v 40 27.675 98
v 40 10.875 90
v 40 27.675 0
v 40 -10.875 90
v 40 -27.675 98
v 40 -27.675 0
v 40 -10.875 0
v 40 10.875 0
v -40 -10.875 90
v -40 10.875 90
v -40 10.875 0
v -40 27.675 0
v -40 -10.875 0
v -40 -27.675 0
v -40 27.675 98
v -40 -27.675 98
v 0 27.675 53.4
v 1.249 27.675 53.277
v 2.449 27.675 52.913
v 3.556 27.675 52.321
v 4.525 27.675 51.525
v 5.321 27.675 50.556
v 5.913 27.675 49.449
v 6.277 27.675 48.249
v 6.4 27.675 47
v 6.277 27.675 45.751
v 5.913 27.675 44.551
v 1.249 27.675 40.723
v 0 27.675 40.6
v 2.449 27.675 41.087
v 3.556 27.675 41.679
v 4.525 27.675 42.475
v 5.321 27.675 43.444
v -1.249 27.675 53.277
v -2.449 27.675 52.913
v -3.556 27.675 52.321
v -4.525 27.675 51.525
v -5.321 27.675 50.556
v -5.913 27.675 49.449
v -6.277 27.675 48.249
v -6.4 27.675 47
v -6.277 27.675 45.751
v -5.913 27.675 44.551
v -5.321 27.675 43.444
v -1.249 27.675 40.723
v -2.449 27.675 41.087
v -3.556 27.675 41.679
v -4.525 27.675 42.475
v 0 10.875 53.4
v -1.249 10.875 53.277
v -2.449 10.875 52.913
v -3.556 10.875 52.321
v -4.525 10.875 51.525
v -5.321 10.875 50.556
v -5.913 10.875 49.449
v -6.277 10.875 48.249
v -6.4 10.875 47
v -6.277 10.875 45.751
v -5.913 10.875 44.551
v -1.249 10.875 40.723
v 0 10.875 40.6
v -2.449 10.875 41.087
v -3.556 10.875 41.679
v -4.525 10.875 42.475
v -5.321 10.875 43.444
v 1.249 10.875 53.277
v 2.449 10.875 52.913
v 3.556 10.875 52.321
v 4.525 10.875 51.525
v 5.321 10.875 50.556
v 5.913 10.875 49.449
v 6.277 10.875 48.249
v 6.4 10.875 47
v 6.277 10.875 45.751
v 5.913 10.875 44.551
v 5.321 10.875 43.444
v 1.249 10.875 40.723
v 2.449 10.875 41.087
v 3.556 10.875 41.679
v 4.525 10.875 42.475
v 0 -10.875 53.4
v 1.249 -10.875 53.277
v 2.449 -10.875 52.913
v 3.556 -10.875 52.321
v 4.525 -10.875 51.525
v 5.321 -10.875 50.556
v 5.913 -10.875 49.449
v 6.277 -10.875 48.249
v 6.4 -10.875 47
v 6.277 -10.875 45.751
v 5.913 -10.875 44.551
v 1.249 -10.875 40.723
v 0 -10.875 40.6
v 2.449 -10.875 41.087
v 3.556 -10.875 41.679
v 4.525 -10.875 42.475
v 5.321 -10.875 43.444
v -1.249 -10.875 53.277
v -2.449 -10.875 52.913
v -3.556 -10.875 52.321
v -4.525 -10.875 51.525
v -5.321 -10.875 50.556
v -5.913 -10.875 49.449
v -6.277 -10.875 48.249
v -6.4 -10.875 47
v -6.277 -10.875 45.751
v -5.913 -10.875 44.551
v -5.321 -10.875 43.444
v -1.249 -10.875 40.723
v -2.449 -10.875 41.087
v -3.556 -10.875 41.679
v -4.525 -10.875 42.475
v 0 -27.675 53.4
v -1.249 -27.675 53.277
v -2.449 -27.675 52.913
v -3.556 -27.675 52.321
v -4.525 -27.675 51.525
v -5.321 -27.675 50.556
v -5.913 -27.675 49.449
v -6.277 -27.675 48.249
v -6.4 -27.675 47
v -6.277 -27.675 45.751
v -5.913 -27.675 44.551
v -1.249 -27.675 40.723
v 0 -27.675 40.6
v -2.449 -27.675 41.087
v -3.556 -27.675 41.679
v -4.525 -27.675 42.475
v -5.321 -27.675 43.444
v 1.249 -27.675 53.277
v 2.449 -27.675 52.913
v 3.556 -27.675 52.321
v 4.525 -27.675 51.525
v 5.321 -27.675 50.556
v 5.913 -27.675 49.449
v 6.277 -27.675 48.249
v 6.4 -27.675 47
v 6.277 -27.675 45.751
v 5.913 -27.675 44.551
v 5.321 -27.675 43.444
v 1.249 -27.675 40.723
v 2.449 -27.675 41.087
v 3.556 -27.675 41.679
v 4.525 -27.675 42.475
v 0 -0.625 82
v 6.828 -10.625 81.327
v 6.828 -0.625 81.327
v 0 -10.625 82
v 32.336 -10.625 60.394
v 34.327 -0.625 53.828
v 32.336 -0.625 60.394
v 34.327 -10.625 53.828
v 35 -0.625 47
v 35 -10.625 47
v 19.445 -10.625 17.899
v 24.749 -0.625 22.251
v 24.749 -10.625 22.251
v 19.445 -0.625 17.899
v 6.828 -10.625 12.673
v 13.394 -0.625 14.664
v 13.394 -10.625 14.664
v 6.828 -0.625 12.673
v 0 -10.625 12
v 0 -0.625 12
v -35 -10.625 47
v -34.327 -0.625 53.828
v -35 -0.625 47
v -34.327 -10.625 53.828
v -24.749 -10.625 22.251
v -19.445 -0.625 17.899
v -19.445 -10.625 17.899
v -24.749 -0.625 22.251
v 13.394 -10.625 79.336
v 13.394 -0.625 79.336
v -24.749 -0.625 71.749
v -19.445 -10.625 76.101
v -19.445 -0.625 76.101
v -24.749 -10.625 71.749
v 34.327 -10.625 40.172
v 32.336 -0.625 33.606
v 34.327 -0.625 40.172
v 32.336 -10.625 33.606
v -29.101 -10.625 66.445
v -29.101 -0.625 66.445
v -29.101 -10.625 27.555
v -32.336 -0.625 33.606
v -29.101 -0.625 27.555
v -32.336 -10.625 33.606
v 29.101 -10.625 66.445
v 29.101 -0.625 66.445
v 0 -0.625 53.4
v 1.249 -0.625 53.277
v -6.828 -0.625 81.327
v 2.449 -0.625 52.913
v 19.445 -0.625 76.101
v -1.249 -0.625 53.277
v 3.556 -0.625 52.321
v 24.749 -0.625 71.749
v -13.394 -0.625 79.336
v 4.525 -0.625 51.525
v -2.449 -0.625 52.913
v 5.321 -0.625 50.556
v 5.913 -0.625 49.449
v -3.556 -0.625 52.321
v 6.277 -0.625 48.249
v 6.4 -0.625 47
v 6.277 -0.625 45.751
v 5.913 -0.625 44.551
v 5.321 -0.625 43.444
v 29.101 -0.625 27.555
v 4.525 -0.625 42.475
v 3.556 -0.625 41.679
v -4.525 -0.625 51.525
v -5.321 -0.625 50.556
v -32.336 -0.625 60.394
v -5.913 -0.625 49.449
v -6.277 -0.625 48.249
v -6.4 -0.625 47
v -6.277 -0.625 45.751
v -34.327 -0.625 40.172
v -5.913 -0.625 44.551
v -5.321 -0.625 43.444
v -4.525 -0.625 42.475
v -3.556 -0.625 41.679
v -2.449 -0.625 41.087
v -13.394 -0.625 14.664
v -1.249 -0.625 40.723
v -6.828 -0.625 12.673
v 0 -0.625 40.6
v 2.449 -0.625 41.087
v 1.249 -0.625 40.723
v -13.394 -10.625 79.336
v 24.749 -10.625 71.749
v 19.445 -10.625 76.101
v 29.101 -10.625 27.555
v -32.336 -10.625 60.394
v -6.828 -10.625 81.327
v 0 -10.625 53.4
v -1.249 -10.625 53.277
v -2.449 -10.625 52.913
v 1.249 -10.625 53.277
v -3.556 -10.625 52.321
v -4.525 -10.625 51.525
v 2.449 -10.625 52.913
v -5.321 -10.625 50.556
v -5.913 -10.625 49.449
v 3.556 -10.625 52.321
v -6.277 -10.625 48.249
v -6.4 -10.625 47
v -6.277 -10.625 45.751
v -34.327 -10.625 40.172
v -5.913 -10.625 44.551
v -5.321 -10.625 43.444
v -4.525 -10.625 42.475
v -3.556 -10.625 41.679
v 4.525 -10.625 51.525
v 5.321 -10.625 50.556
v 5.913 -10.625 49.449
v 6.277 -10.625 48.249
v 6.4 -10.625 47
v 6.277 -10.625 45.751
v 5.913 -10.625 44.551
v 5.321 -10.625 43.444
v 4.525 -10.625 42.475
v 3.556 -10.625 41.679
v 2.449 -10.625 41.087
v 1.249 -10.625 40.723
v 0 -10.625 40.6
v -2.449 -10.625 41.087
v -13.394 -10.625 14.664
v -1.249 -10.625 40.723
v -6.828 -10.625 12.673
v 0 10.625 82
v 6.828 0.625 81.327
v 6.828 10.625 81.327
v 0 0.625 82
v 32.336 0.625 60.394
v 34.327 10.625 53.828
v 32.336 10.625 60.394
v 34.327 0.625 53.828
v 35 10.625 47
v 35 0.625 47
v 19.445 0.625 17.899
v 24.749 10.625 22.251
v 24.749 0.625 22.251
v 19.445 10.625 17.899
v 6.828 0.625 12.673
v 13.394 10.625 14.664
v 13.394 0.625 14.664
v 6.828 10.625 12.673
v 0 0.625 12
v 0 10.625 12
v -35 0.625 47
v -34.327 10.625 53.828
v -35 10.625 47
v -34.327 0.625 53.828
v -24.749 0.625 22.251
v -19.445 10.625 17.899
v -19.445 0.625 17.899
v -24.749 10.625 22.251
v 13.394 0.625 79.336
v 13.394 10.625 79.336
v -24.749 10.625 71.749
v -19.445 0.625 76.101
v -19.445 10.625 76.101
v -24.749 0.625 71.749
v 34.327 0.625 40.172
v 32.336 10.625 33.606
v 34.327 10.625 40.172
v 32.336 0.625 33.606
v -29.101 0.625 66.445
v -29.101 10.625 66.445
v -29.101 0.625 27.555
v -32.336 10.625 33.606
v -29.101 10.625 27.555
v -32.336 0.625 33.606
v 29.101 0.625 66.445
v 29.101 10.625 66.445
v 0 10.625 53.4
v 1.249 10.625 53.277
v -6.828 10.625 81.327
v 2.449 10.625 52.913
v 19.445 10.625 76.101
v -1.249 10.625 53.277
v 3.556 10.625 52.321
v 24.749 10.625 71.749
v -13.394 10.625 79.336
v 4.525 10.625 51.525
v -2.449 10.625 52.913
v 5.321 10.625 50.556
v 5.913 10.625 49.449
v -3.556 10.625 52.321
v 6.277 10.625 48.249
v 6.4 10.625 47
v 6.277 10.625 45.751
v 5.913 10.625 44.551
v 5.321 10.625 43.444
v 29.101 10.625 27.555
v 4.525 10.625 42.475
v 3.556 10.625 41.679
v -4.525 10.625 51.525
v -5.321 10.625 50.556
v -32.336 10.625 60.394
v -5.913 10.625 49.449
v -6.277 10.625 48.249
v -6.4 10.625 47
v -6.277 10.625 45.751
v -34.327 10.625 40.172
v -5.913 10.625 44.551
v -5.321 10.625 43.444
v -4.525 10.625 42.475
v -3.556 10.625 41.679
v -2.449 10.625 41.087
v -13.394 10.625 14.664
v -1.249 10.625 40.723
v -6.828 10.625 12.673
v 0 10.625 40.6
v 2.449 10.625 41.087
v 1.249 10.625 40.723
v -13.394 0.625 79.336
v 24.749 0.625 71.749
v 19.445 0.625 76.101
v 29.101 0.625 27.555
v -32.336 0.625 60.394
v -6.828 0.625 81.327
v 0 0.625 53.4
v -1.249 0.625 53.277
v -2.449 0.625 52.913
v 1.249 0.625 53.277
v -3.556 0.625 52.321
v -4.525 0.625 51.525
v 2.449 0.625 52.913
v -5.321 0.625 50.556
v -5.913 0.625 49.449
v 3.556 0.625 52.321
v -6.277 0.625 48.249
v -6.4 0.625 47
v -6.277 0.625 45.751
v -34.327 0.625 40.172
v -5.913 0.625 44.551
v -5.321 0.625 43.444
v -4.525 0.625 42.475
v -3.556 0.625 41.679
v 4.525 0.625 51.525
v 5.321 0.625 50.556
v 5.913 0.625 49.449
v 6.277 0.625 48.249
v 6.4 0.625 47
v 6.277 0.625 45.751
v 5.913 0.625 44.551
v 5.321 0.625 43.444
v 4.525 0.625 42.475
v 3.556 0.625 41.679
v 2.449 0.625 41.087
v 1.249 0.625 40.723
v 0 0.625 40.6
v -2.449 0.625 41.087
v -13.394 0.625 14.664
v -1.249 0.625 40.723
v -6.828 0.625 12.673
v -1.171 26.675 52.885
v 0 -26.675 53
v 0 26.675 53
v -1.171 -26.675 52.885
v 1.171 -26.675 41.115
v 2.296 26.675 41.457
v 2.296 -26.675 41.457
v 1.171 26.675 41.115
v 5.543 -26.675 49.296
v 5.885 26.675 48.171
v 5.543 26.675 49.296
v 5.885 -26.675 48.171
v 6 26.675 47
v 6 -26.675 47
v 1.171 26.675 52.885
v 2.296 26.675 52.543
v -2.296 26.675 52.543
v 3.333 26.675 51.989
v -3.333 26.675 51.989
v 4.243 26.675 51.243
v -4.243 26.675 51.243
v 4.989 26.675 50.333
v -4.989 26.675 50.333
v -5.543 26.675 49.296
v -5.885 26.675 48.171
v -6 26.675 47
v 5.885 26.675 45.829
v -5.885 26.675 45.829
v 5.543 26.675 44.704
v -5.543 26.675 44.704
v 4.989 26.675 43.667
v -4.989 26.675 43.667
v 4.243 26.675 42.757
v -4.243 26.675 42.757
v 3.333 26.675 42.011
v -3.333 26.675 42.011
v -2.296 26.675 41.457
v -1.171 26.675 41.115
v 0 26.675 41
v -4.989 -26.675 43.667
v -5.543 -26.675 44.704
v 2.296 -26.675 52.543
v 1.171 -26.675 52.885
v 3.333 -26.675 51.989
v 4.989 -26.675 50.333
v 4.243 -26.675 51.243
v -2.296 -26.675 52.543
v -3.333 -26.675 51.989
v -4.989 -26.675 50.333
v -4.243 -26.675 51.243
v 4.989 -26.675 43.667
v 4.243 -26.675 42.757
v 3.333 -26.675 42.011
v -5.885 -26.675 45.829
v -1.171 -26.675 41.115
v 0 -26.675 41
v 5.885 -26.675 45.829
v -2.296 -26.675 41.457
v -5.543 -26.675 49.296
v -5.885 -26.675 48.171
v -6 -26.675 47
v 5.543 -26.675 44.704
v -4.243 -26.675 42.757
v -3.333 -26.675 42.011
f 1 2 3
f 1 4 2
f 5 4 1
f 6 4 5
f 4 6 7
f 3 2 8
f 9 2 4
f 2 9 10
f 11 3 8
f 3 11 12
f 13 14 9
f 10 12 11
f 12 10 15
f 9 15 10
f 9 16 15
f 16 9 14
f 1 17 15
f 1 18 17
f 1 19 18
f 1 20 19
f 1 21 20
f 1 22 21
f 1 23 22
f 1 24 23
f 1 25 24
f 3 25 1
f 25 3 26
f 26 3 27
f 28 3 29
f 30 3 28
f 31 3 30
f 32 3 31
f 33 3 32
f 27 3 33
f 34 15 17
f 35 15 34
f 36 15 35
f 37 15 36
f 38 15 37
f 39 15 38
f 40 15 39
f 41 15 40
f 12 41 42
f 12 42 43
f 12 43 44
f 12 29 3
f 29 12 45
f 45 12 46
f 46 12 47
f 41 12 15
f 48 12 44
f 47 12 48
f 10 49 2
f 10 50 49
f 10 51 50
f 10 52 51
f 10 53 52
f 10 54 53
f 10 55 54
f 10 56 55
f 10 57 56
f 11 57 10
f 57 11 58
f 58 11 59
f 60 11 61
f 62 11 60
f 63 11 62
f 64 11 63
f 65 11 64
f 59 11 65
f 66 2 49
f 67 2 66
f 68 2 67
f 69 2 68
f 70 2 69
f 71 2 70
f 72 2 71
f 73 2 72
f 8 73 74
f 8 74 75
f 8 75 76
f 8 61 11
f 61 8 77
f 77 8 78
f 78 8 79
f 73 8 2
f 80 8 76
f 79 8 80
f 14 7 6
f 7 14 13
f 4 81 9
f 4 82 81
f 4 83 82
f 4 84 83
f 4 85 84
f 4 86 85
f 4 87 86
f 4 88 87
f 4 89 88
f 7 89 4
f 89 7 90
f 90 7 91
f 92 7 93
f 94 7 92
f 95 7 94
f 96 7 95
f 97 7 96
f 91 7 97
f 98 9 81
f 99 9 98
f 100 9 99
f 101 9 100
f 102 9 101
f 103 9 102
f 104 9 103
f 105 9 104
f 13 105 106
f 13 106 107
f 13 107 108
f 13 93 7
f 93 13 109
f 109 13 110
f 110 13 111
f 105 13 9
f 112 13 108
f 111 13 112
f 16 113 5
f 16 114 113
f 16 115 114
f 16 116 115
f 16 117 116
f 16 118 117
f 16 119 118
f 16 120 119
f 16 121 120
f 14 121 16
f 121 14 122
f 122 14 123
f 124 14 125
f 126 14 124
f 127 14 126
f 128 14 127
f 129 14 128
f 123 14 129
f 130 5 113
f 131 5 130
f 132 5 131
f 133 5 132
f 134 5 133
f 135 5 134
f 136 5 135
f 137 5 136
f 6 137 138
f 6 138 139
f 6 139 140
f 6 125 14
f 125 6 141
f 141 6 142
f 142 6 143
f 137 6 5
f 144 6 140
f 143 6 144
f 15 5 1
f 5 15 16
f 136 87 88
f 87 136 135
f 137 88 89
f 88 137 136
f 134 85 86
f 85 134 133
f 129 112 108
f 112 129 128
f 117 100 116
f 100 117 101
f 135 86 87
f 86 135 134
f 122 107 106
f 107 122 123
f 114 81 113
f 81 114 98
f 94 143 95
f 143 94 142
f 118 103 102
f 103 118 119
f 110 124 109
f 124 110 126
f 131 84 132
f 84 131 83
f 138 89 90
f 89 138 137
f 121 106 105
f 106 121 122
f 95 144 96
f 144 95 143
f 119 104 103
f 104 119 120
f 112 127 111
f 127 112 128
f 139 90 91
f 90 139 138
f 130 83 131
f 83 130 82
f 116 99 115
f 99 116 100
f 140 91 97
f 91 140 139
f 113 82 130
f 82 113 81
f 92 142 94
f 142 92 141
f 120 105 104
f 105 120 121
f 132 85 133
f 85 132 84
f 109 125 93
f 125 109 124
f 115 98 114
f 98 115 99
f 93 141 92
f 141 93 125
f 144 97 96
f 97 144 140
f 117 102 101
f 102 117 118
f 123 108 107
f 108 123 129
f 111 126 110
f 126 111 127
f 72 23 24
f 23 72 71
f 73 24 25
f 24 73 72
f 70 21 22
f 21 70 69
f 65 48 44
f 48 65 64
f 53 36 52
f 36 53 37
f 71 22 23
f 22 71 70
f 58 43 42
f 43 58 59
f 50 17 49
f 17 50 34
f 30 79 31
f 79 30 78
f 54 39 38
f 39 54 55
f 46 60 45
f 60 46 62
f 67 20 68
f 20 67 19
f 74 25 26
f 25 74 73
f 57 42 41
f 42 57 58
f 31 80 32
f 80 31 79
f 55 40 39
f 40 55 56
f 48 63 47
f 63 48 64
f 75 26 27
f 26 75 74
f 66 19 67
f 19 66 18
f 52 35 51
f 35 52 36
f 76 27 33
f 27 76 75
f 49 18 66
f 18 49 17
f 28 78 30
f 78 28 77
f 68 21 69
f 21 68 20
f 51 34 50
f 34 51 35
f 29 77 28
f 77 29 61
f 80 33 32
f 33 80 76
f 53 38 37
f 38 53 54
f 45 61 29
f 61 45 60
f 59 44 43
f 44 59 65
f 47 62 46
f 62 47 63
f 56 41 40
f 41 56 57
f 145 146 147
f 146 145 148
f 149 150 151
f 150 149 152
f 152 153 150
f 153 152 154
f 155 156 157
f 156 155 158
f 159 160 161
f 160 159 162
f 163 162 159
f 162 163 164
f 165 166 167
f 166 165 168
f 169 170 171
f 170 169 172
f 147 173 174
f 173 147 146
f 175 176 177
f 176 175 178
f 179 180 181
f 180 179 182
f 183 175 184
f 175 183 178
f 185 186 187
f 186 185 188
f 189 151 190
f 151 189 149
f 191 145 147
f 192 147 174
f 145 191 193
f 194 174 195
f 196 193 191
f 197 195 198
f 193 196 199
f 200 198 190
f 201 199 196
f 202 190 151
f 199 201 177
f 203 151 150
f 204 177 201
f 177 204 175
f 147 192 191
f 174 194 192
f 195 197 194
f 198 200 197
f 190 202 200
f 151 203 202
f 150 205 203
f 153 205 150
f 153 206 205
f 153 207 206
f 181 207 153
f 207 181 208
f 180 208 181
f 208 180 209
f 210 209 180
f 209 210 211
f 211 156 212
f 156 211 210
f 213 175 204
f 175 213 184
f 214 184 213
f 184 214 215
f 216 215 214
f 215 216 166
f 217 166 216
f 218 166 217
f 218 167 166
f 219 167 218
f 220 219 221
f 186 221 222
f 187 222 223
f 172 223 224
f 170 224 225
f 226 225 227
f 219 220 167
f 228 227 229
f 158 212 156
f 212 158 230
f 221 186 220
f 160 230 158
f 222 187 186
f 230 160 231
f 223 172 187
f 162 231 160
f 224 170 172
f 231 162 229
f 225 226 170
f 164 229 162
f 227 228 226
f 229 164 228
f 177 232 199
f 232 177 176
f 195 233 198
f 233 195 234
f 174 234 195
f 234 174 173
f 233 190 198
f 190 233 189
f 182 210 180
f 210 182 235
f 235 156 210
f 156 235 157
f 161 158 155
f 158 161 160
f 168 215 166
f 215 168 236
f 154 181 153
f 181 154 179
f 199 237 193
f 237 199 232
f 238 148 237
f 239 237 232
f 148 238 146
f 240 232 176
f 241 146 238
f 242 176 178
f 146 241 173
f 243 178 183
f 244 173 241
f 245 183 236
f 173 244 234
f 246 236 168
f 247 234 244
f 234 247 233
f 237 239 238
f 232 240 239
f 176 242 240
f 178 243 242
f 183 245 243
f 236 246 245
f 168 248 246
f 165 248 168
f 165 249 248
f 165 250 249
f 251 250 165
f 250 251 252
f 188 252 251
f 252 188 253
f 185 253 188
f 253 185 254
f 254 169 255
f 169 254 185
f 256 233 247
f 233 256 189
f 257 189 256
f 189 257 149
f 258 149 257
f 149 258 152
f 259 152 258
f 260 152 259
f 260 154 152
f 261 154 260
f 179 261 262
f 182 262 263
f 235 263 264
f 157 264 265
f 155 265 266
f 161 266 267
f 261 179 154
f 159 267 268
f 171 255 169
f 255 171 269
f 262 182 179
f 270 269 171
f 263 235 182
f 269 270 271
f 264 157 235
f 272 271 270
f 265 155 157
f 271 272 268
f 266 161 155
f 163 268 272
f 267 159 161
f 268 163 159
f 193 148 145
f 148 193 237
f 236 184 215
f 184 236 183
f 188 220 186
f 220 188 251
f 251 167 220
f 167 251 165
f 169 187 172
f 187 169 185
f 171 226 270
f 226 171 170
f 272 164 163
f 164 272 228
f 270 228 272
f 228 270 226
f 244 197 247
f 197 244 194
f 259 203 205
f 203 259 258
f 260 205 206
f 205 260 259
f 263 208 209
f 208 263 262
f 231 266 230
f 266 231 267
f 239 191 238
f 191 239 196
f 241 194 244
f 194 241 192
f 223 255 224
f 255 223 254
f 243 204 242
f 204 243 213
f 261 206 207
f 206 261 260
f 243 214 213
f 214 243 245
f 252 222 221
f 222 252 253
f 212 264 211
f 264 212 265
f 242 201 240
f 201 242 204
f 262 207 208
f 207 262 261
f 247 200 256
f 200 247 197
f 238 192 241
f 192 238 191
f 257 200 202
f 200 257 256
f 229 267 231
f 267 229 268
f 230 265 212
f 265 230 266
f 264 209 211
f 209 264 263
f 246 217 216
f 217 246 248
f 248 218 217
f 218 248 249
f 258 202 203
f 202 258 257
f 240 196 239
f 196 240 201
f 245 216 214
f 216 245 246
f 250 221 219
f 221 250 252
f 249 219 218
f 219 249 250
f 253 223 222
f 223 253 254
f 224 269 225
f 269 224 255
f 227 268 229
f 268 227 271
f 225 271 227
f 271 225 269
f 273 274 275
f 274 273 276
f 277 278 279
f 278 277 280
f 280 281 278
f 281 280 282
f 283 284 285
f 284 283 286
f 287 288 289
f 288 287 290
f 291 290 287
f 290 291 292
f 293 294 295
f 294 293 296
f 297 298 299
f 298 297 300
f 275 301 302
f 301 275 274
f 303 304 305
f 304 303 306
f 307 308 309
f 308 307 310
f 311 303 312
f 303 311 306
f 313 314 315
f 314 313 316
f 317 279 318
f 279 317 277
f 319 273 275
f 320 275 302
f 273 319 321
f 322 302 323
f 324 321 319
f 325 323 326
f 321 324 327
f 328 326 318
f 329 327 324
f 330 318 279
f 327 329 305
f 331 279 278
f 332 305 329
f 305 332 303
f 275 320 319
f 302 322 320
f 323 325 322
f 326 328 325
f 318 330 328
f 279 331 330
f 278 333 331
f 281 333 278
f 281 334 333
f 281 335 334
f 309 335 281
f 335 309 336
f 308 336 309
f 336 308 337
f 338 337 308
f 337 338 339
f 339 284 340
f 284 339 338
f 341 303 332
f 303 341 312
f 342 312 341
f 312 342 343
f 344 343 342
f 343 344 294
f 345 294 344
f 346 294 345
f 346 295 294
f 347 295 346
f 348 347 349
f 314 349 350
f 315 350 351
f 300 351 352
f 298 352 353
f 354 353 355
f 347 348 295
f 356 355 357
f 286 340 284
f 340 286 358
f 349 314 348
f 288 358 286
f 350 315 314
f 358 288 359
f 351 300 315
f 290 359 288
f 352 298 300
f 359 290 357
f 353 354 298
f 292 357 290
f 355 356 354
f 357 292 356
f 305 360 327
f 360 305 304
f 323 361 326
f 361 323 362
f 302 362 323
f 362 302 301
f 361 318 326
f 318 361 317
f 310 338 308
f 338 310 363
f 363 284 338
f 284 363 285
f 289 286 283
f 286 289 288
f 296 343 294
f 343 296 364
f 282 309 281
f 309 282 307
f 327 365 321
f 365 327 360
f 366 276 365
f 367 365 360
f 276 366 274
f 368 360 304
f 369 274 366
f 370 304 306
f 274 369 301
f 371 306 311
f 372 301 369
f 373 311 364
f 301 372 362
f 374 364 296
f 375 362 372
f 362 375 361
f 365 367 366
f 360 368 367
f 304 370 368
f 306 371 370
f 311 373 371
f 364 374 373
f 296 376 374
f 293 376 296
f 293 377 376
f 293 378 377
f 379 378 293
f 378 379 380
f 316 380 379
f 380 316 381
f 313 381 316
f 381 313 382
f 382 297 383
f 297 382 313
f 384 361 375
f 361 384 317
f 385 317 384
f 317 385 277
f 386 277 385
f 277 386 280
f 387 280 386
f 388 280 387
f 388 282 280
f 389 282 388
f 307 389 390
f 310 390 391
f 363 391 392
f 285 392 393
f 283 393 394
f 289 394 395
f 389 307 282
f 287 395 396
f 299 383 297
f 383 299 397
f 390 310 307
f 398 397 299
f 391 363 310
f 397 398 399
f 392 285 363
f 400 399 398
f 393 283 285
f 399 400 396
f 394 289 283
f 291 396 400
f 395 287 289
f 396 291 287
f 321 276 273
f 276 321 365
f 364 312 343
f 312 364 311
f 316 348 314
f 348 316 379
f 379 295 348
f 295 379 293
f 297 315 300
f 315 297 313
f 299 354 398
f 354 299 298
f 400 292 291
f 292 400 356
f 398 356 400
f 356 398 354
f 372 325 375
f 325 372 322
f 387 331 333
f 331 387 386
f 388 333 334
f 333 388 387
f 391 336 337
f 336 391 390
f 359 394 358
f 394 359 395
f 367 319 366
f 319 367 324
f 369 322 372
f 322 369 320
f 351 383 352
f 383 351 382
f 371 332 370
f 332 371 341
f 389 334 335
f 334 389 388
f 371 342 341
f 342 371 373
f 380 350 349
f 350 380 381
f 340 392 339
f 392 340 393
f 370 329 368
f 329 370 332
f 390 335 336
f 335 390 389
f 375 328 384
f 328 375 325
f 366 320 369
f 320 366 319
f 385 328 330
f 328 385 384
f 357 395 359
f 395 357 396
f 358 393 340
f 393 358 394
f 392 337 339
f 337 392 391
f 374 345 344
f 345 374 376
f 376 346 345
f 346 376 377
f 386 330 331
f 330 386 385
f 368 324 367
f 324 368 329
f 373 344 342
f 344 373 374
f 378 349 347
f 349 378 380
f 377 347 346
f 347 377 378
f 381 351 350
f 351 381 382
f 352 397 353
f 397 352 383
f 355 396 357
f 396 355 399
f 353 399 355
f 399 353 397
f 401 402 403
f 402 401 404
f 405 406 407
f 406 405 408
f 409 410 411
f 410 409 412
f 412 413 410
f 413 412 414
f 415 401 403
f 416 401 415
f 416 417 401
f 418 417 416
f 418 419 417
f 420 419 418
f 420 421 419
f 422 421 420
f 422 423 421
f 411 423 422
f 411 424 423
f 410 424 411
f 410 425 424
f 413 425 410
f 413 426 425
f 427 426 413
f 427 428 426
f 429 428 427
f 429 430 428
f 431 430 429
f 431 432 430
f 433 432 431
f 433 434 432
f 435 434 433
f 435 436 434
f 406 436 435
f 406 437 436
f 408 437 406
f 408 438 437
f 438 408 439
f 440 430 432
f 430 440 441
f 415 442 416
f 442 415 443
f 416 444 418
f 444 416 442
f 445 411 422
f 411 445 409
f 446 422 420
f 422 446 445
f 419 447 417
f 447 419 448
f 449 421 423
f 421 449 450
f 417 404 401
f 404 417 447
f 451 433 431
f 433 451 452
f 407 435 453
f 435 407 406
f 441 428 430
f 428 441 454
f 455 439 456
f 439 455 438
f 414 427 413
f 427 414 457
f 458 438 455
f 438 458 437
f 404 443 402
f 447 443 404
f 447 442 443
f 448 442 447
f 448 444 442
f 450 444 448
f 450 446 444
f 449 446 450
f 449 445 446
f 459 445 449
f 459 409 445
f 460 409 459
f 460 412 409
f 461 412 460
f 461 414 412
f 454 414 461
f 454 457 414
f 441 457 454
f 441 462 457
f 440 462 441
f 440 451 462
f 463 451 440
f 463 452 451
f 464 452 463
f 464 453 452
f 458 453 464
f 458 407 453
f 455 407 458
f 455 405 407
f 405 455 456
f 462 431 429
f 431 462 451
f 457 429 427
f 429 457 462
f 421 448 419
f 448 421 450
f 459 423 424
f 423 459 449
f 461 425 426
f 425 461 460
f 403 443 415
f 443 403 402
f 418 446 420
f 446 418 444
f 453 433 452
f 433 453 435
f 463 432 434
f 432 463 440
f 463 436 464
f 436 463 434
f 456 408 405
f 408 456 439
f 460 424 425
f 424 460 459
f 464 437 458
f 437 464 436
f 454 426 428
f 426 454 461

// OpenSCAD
$fn = 32;

// ------------------------------------------------------------------------
// Trolley wheel set: wheels d70, fork 90 mm tall
// Every part is its own module, assembly() places every instance.
// ------------------------------------------------------------------------

// --- part 1 ---
module trolley_fork() {
  difference() {
    union() {
      translate([-40, 10.875, 0]) cube([80, 16.8, 90]);
      translate([-40, -27.675, 0]) cube([80, 16.8, 90]);
      translate([-40, -27.675, 90]) cube([80, 55.35, 8]);
    }
    translate([0, -19.275, 47]) rotate([90, 0, 0]) cylinder(h = 18.8, d = 12.8, center = true);
    translate([0, 19.275, 47]) rotate([90, 0, 0]) cylinder(h = 18.8, d = 12.8, center = true);
  }
}

// --- part 2 ---
module trolley_wheel() {
  difference() {
      translate([0, 0, 0]) cylinder(h = 10, d = 70);
      translate([0, 0, -1]) cylinder(h = 12, d = 12.8);
    }
}

// --- part 3 ---
module trolley_axle() {
  translate([0, 0, -26.675]) cylinder(h = 53.35, d = 12);
}

// --- assembly ---
module assembly() {
  color([0.80, 0.24, 0.20]) translate([0, 0, 0]) rotate([0, 0, 0]) trolley_fork();
  color([0.20, 0.45, 0.75]) translate([0, -0.625, 47]) rotate([90, 0, 0]) trolley_wheel();
  color([0.25, 0.62, 0.32]) translate([0, 10.625, 47]) rotate([90, 0, 0]) trolley_wheel();
  color([0.92, 0.70, 0.18]) translate([0, 0, 47]) rotate([90, 0, 0]) trolley_axle();
}

assembly();
